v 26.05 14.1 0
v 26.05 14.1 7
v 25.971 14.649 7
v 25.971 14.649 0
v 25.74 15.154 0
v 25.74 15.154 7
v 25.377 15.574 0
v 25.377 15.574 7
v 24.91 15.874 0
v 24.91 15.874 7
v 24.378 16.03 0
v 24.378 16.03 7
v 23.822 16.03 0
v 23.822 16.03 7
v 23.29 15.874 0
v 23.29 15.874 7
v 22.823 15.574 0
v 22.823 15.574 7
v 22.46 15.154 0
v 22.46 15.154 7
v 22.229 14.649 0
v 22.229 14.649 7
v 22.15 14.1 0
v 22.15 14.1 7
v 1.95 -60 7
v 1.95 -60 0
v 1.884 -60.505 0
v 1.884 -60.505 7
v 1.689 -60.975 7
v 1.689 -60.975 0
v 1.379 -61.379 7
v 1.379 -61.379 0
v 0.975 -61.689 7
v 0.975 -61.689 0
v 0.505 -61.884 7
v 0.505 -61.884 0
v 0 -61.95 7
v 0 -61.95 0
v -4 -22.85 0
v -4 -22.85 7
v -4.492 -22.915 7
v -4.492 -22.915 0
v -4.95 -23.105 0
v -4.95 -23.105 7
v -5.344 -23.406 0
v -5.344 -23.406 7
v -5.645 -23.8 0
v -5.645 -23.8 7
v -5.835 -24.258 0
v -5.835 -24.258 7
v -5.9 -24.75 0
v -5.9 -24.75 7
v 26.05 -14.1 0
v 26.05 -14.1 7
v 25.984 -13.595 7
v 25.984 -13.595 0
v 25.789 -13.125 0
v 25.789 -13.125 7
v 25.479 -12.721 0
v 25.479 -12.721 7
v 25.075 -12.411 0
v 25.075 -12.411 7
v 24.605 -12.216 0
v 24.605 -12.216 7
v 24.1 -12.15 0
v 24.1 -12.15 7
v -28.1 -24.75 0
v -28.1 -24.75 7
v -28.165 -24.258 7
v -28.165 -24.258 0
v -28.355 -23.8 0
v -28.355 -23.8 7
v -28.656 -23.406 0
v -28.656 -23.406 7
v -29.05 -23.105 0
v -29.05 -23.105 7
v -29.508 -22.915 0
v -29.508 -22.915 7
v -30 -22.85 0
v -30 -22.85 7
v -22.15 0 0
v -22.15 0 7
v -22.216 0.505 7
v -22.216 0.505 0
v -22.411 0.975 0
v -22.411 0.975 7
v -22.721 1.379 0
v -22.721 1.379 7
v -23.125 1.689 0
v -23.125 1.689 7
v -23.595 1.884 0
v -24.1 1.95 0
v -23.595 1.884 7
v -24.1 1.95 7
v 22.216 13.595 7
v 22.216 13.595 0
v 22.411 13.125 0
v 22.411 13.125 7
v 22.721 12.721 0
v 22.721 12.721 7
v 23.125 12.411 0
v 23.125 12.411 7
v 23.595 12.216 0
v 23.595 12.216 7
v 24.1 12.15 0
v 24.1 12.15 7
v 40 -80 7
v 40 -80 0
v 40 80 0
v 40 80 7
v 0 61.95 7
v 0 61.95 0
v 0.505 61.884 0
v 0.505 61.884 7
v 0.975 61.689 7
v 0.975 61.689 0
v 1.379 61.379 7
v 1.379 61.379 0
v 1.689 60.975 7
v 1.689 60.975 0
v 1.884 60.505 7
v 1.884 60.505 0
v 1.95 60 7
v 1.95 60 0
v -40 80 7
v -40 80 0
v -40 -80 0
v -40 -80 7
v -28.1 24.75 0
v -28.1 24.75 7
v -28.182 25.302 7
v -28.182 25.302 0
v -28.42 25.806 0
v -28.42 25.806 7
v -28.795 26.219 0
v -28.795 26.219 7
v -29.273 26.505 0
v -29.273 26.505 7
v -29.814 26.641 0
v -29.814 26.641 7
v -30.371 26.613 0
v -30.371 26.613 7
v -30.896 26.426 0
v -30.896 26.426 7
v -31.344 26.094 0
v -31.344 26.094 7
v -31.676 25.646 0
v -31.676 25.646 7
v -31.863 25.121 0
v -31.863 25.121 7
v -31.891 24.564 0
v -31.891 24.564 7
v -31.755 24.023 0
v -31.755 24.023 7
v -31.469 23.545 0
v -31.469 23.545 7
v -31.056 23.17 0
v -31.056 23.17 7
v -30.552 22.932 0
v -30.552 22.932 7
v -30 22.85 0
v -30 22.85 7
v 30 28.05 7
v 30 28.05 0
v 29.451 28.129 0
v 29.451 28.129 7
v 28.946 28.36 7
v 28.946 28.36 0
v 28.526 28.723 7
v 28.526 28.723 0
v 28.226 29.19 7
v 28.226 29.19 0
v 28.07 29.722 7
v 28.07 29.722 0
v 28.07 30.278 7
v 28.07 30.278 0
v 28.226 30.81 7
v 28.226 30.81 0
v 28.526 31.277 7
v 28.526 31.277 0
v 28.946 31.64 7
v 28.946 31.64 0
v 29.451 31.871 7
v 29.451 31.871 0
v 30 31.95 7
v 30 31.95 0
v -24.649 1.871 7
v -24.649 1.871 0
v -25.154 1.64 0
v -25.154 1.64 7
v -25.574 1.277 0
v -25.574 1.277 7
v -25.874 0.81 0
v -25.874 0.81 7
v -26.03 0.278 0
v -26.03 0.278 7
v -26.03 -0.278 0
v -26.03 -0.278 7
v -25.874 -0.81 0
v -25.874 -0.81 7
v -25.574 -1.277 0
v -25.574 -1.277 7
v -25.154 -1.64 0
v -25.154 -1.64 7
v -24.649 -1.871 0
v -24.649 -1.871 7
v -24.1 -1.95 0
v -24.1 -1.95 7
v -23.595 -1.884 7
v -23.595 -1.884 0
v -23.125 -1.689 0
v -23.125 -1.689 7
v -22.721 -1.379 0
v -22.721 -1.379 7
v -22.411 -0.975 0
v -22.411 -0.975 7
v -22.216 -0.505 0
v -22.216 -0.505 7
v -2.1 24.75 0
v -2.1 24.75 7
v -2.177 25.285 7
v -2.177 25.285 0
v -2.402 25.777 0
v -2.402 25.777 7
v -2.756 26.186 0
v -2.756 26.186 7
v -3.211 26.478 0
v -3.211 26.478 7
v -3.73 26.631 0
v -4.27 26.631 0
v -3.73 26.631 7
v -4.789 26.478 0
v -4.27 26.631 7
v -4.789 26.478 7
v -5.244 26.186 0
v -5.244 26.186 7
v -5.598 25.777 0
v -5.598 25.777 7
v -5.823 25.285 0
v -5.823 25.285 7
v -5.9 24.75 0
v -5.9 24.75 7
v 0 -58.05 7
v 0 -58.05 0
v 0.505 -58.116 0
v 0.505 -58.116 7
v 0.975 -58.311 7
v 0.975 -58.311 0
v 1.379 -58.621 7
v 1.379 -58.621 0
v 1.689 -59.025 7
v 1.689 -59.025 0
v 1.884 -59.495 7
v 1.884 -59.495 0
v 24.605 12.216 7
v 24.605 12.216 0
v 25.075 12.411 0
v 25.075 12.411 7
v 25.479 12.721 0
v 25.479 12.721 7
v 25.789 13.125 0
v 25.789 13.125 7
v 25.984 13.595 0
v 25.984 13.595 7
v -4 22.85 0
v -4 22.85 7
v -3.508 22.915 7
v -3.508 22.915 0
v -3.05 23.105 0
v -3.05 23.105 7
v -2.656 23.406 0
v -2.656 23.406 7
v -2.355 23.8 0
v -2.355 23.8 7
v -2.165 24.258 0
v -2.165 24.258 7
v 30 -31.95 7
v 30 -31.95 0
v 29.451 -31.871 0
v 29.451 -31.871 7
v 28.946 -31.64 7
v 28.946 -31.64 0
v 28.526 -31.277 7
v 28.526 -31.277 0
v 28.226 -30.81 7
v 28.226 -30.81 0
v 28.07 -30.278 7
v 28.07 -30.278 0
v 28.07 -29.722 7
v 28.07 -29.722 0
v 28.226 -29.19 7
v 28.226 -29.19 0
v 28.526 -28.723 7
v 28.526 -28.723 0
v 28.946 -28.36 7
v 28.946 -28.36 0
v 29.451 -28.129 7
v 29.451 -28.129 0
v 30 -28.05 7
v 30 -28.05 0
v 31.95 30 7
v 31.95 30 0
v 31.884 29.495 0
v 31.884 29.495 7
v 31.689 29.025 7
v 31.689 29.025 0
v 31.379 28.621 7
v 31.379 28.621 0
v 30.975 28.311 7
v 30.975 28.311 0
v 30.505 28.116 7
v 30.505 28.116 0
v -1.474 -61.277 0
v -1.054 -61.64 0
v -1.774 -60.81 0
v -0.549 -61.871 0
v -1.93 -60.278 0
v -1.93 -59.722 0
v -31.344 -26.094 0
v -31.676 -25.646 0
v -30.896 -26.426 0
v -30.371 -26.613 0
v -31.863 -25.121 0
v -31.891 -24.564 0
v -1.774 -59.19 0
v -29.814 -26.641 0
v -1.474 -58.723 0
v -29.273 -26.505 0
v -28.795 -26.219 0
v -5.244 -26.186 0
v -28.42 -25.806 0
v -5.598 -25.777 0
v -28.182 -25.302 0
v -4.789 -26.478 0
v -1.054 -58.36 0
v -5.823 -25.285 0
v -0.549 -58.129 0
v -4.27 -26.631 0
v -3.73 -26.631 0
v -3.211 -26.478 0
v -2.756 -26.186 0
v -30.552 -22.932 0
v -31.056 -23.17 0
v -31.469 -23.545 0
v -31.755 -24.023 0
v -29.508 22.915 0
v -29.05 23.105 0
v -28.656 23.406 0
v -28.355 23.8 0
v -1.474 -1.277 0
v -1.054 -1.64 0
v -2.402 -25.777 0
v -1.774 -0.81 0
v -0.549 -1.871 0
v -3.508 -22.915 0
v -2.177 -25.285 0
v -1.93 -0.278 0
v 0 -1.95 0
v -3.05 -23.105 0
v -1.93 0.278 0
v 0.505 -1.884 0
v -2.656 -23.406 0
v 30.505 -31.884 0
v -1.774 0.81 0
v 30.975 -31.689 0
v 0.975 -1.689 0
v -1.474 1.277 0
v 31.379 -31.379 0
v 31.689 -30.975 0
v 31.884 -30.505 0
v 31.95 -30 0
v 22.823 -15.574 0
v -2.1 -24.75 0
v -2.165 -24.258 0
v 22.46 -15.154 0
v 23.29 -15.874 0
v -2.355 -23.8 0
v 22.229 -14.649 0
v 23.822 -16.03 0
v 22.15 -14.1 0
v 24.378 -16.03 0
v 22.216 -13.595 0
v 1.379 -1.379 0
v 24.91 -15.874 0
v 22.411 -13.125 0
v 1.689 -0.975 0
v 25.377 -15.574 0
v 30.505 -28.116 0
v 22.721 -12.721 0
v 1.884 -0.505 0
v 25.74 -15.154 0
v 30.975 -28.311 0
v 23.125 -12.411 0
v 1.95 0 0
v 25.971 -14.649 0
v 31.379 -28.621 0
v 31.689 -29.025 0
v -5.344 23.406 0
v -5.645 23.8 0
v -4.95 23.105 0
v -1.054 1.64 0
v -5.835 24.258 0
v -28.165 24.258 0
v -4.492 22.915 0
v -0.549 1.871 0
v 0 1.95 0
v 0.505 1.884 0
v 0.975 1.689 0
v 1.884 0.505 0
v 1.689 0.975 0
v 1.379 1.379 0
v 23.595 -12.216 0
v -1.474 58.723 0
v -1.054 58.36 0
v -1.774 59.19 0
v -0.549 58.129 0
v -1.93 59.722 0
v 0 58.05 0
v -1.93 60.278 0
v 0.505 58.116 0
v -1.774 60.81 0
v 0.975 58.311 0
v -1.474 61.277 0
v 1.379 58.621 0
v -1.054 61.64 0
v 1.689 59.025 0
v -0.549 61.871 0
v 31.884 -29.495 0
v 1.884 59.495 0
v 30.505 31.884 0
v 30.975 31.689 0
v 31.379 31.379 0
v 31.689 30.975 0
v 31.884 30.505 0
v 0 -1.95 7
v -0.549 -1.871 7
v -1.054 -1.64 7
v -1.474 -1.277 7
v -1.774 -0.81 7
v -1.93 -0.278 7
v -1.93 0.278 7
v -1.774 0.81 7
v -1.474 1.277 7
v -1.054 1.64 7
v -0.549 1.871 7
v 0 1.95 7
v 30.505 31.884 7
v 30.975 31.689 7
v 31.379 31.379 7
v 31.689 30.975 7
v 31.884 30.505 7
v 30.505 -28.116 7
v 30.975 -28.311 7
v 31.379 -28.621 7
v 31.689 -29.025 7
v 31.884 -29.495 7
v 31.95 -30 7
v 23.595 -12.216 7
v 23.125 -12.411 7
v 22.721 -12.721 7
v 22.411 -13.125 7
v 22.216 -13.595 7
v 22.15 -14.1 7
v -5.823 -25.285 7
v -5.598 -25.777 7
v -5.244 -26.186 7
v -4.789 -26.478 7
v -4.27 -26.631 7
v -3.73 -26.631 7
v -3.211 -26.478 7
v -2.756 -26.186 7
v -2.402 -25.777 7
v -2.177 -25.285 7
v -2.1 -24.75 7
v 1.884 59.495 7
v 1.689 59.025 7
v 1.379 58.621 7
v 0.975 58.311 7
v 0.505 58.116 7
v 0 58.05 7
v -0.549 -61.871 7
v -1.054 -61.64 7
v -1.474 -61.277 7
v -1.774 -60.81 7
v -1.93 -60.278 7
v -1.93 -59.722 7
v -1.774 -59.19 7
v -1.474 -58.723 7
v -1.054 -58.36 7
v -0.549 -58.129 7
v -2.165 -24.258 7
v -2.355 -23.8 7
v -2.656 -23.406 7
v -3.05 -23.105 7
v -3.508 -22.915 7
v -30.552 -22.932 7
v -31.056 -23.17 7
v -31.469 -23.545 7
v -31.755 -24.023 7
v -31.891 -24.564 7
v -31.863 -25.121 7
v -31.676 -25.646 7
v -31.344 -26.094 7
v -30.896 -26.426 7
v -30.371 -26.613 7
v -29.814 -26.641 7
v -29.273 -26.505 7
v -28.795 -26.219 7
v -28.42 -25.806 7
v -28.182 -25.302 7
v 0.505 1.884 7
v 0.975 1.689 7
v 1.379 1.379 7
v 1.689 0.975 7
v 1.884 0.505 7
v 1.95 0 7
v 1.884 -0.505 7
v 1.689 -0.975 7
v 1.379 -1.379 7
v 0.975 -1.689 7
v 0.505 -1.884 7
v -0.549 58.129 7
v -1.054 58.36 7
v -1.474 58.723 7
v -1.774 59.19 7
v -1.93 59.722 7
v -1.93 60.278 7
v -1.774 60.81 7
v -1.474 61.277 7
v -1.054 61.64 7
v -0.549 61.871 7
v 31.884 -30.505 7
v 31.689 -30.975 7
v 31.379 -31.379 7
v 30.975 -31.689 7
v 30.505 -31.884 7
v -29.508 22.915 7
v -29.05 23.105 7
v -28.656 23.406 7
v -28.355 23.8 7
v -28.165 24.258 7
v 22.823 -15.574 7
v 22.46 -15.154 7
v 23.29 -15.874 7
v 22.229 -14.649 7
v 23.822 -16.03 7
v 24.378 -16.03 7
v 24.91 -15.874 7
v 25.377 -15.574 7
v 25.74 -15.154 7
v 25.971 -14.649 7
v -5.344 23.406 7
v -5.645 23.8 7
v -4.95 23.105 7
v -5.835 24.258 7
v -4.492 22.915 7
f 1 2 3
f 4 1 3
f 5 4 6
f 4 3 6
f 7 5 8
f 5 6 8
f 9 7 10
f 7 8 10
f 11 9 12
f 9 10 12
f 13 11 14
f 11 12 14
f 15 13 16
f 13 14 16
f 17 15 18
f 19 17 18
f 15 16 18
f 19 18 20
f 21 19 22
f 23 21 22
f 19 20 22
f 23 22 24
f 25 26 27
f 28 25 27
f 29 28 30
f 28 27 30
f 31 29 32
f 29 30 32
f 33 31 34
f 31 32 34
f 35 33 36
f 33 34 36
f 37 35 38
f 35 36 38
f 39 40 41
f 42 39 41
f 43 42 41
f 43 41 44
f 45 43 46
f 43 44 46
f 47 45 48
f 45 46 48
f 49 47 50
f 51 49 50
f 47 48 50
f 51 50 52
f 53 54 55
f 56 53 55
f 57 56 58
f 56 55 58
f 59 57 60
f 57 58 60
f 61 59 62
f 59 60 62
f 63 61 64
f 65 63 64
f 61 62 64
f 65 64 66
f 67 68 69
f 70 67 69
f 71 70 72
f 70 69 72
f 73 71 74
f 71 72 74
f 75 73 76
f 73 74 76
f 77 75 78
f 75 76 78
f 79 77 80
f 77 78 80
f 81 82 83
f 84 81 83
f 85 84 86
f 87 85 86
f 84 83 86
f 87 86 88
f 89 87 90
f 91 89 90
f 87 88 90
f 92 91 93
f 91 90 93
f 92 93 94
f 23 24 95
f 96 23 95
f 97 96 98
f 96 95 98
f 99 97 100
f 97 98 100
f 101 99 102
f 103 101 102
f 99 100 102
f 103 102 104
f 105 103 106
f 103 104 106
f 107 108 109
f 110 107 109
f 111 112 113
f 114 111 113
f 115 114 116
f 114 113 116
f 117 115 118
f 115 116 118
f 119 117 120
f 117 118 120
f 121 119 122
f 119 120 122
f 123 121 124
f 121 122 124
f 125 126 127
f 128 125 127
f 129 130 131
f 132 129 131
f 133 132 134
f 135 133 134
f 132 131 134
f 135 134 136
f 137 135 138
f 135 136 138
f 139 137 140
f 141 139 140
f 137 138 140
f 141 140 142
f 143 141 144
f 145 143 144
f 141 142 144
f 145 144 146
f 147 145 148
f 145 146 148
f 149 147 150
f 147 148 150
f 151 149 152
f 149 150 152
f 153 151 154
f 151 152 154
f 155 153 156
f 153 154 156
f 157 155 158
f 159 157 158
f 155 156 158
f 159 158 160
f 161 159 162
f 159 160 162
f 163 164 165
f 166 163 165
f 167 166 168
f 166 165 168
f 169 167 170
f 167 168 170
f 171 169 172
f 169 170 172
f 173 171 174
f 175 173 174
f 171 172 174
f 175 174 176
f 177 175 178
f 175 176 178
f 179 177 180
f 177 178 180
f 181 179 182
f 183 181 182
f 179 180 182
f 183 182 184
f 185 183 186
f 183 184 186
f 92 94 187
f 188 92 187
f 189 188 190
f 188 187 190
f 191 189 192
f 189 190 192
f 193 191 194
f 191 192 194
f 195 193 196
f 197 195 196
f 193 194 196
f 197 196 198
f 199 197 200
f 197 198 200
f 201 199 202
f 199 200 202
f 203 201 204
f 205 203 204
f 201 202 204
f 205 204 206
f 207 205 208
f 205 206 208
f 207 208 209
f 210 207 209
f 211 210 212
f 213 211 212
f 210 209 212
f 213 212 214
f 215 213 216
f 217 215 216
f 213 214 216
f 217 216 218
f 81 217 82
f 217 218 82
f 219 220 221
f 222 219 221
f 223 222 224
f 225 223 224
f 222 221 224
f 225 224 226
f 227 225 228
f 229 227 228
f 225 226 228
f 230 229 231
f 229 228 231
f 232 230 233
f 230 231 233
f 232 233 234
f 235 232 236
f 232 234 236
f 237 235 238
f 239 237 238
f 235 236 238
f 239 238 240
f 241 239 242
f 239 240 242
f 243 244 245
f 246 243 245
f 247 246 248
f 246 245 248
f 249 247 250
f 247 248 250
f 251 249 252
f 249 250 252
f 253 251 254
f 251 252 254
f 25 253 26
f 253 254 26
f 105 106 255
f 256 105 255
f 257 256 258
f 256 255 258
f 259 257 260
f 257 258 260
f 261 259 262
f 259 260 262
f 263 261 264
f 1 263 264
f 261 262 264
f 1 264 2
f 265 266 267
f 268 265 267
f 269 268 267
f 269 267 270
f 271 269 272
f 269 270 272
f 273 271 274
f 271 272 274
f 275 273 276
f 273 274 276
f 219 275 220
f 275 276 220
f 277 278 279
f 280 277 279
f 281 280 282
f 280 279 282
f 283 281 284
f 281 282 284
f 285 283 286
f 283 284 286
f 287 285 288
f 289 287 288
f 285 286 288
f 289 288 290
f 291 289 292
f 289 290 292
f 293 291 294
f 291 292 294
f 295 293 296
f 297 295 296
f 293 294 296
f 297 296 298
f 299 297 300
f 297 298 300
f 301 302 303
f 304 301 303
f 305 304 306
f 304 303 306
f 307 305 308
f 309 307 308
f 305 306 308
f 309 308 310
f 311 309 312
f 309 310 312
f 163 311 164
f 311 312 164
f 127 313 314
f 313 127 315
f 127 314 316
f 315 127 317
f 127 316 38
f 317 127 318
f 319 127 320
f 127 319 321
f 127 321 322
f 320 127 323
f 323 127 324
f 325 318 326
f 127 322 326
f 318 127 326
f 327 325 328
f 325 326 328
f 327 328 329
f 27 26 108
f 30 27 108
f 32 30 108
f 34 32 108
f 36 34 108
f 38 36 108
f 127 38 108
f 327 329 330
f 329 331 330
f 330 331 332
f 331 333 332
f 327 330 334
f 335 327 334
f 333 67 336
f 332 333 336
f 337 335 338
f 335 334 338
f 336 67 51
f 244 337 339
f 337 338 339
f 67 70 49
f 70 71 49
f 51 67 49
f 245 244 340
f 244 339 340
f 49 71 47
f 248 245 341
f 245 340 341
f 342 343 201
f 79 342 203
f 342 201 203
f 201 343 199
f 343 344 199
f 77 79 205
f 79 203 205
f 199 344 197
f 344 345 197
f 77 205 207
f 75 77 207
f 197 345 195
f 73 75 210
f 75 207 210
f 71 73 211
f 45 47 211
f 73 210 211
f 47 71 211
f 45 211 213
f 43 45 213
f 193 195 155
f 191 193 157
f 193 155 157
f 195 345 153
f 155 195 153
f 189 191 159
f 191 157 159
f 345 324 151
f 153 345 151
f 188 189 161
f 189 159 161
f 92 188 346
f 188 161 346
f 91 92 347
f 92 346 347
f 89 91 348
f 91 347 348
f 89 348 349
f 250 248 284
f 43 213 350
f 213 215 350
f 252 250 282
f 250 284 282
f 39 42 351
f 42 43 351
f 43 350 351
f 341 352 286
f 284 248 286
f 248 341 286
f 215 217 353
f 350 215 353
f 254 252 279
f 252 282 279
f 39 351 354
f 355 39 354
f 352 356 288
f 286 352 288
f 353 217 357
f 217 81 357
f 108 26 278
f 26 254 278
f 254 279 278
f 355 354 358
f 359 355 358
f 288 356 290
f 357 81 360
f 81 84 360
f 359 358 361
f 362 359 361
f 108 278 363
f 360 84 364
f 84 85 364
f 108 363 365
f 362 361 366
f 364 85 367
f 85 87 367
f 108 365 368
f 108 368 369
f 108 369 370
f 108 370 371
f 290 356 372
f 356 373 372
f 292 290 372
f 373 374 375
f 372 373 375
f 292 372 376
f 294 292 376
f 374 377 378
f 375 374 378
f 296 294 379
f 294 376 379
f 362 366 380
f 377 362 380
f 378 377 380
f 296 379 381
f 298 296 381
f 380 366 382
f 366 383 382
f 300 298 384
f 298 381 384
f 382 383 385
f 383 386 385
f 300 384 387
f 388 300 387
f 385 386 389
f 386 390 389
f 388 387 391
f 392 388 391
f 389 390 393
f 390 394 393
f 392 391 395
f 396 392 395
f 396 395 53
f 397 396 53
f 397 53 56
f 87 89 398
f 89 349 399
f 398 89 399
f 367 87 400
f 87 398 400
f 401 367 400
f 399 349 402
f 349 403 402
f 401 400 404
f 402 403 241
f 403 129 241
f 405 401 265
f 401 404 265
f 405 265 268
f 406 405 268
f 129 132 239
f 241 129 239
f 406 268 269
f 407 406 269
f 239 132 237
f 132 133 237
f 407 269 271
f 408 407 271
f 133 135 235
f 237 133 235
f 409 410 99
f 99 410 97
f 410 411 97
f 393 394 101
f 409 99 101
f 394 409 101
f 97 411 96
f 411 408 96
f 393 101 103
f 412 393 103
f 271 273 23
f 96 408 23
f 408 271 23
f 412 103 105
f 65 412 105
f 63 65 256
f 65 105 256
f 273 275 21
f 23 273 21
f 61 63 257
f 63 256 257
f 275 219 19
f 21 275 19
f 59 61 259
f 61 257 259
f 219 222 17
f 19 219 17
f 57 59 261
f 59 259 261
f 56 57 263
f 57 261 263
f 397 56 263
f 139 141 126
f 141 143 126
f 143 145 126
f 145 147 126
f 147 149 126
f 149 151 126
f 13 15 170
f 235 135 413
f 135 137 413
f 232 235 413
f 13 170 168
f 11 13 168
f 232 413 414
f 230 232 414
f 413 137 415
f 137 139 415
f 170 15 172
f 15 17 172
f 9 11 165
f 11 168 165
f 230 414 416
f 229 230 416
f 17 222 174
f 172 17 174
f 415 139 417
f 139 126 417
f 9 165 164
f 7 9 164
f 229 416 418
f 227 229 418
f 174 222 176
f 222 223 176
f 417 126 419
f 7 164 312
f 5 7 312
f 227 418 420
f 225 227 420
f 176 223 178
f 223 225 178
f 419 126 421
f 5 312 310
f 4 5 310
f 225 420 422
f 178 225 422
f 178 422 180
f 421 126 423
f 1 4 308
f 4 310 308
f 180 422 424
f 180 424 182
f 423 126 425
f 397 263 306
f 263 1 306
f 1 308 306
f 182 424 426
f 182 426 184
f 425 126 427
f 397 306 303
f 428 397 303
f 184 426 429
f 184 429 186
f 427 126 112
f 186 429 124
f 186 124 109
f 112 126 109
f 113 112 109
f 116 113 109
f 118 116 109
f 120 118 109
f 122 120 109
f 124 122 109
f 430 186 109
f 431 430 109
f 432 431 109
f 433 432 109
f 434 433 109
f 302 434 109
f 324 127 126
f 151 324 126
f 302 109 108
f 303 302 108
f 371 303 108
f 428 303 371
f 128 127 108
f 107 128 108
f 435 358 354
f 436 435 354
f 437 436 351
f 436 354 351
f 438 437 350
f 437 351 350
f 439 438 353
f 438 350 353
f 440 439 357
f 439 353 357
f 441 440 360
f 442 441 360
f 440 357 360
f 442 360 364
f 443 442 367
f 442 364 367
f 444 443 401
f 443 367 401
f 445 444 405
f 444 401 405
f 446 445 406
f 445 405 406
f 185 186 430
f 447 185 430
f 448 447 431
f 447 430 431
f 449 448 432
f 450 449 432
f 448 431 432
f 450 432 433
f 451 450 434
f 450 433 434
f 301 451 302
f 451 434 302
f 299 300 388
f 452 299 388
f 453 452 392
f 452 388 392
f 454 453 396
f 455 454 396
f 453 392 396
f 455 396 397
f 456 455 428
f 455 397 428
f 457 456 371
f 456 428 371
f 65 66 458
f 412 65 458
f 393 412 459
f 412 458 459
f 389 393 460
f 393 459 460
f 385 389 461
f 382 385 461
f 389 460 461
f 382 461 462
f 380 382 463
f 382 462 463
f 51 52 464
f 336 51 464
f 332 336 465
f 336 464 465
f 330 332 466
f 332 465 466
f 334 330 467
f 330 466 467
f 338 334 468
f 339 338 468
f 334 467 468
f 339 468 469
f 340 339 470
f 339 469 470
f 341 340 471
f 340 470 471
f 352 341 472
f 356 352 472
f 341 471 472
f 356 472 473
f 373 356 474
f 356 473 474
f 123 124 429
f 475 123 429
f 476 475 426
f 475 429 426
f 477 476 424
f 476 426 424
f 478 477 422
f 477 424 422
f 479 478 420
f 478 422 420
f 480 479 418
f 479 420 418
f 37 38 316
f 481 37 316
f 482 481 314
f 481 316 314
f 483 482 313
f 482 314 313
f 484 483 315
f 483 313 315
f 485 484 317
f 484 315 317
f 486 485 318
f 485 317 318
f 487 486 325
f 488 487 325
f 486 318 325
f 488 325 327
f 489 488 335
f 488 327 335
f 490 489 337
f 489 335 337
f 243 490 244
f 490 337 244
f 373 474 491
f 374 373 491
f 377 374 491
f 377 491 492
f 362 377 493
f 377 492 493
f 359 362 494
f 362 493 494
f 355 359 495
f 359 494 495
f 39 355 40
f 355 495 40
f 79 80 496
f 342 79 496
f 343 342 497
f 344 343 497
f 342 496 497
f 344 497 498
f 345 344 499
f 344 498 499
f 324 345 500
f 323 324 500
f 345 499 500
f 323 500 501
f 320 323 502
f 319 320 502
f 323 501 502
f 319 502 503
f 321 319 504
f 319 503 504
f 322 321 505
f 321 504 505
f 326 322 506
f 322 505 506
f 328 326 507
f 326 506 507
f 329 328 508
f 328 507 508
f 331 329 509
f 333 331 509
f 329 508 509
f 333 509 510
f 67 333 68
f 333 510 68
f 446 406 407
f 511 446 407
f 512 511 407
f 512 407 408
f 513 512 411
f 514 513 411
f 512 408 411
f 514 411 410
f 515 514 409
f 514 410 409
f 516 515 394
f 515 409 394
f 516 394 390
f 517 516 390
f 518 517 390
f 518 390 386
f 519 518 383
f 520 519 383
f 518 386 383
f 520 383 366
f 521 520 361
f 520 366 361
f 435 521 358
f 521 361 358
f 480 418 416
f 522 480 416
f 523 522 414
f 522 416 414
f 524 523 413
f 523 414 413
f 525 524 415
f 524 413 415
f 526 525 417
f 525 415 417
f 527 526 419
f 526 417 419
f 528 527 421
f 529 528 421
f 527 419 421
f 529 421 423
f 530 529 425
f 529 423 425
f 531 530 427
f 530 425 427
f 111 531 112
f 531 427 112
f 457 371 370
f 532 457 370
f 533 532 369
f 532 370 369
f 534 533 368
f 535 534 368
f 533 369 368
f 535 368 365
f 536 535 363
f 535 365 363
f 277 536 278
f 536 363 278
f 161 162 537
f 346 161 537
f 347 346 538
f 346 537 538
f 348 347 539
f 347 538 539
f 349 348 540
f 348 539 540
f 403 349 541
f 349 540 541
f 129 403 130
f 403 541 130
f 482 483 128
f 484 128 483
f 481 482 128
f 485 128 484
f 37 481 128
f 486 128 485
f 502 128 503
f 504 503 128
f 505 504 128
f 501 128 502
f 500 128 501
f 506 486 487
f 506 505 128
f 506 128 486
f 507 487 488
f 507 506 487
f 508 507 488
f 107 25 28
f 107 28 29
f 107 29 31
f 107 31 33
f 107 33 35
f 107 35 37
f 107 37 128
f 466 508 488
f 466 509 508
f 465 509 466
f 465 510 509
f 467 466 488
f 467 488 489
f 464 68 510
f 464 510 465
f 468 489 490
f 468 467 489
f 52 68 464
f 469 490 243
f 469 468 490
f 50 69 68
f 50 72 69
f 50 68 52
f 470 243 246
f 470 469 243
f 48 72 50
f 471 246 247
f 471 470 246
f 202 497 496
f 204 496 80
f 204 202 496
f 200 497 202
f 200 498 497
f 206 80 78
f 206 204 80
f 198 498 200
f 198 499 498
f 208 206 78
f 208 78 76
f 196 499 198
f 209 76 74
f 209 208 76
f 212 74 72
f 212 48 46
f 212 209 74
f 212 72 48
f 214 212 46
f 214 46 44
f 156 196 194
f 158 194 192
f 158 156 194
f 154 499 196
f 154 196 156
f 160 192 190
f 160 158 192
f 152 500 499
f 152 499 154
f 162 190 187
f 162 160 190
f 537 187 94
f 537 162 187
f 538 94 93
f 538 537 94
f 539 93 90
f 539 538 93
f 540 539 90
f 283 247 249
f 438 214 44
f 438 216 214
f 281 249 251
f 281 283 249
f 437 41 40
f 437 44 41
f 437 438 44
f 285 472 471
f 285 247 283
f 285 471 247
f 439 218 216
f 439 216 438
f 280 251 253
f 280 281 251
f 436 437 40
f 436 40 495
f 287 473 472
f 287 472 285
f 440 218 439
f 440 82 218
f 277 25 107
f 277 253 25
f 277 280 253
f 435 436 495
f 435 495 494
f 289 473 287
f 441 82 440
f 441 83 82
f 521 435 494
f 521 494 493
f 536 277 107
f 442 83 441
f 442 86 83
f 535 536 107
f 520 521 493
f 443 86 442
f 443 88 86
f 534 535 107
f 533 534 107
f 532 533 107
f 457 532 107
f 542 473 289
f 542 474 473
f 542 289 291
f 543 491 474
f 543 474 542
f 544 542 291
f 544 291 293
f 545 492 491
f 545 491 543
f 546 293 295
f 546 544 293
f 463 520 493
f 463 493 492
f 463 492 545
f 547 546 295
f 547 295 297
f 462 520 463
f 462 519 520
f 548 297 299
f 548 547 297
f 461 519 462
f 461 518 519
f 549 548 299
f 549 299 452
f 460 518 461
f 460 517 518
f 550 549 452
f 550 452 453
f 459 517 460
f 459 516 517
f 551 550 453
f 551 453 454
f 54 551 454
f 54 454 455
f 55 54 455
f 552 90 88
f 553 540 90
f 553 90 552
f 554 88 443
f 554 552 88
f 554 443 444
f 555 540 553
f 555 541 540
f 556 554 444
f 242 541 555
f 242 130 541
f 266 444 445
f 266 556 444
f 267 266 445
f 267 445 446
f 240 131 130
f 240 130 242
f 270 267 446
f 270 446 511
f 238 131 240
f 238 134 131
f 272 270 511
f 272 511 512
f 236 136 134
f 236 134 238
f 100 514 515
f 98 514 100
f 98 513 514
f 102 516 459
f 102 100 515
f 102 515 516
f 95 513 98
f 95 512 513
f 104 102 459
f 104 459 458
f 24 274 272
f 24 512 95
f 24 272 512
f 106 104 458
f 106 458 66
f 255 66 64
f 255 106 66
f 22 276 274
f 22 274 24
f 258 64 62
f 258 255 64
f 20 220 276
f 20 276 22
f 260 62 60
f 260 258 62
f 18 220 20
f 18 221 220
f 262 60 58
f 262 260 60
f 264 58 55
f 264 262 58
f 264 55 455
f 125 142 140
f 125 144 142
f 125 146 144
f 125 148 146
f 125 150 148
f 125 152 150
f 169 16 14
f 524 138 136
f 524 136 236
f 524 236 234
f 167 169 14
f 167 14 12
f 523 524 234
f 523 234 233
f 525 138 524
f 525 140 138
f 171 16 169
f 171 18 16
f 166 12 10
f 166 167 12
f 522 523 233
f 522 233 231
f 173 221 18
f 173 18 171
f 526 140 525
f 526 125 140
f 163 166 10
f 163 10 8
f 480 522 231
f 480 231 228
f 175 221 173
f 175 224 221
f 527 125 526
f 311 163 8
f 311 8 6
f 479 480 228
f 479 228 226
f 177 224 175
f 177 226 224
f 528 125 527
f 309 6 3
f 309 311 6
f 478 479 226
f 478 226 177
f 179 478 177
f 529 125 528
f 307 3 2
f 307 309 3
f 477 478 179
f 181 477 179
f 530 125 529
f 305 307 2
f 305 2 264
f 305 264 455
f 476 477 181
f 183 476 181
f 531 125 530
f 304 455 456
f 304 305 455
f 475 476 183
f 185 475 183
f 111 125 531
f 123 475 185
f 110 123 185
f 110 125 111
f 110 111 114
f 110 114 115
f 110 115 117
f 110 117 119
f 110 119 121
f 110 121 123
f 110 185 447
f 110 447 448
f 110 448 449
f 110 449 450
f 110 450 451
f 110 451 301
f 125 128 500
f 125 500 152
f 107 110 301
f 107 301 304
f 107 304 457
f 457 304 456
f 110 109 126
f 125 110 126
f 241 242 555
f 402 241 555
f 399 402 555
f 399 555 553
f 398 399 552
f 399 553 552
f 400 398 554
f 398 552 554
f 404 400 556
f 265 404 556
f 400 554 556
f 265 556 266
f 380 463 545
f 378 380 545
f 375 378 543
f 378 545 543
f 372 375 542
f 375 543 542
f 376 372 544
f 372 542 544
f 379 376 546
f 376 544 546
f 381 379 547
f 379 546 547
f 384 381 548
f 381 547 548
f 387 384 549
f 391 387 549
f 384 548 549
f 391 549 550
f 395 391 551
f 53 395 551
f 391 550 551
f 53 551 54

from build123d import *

# Parameters (mm, degrees)
EXTRUDE_1_DEPTH     = 7
CUT_EXTRUDE_2_DEPTH = 10
CUT_EXTRUDE_1_DEPTH = 10


with BuildPart() as part:
    # 草图1 → 凸台-拉伸1 (new body)
    with BuildSketch(Plane.XY):
        with BuildLine():
            Line((0, 61.95), (0, 80))
            Line((0, 80), (-40, 80))
            Line((-40, 80), (-40, -80))
            Line((-40, -80), (0, -80))
            Line((0, -80), (0, -61.95))
            ThreePointArc((0, -61.95), (-1.95, -60), (0, -58.05))
            Line((0, -58.05), (0, -1.95))
            ThreePointArc((0, -1.95), (-1.95, 0), (0, 1.95))
            Line((0, 1.95), (0, 58.05))
            ThreePointArc((0, 58.05), (-1.95, 60), (0, 61.95))
        make_face()
        with BuildLine():
            Line((30, 80), (0, 80))
            Line((0, 80), (0, 61.95))
            ThreePointArc((0, 61.95), (1.378858223, 61.378858223), (1.95, 60))
            ThreePointArc((1.95, 60), (1.378858223, 58.621141777), (0, 58.05))
            Line((0, 58.05), (0, 1.95))
            ThreePointArc((0, 1.95), (1.378858223, 1.378858223), (1.95, 0))
            ThreePointArc((1.95, 0), (1.378858223, -1.378858223), (0, -1.95))
            Line((0, -1.95), (0, -58.05))
            ThreePointArc((0, -58.05), (1.378858223, -58.621141777), (1.95, -60))
            ThreePointArc((1.95, -60), (1.378858223, -61.378858223), (0, -61.95))
            Line((0, -61.95), (0, -80))
            Line((0, -80), (30, -80))
            Line((30, -80), (30, -31.95))
            ThreePointArc((30, -31.95), (28.05, -30), (30, -28.05))
            Line((30, -28.05), (30, 28.05))
            ThreePointArc((30, 28.05), (28.05, 30), (30, 31.95))
            Line((30, 31.95), (30, 80))
        make_face()
        with BuildLine():
            Line((40, 80), (30, 80))
            Line((30, 80), (30, 31.95))
            ThreePointArc((30, 31.95), (31.378858223, 31.378858223), (31.95, 30))
            ThreePointArc((31.95, 30), (31.378858223, 28.621141777), (30, 28.05))
            Line((30, 28.05), (30, -28.05))
            ThreePointArc((30, -28.05), (31.378858223, -28.621141777), (31.95, -30))
            ThreePointArc((31.95, -30), (31.378858223, -31.378858223), (30, -31.95))
            Line((30, -31.95), (30, -80))
            Line((30, -80), (40, -80))
            Line((40, -80), (40, 80))
        make_face()
    extrude(amount=EXTRUDE_1_DEPTH)

    # 草图3 → 切除-拉伸2 (cut)
    with BuildSketch(Plane.XY.offset(7)):
        with BuildLine():
            ThreePointArc((-28.1, 24.75), (-31.343502884, 26.093502884), (-30, 22.85))
            Line((-30, 22.85), (-30, 24.75))
            Line((-30, 24.75), (-28.1, 24.75))
        make_face()
        with BuildLine():
            Line((-30, 24.75), (-30, 22.85))
            ThreePointArc((-30, 22.85), (-28.656497116, 23.406497116), (-28.1, 24.75))
            Line((-28.1, 24.75), (-30, 24.75))
        make_face()
        with BuildLine():
            ThreePointArc((-5.9, 24.75), (-5.343502884, 23.406497116), (-4, 22.85))
            Line((-4, 22.85), (-4, 24.75))
            Line((-4, 24.75), (-5.9, 24.75))
        make_face()
        with BuildLine():
            Line((-4, 24.75), (-4, 22.85))
            ThreePointArc((-4, 22.85), (-2.656497116, 23.406497116), (-2.1, 24.75))
            ThreePointArc((-2.1, 24.75), (-4, 26.65), (-5.9, 24.75))
            Line((-5.9, 24.75), (-4, 24.75))
        make_face()
        with BuildLine():
            Line((-30, -22.85), (-30, -24.75))
            Line((-30, -24.75), (-28.1, -24.75))
            ThreePointArc((-28.1, -24.75), (-28.656497116, -23.406497116), (-30, -22.85))
        make_face()
        with BuildLine():
            Line((-28.1, -24.75), (-30, -24.75))
            Line((-30, -24.75), (-30, -22.85))
            ThreePointArc((-30, -22.85), (-31.343502884, -26.093502884), (-28.1, -24.75))
        make_face()
        with BuildLine():
            ThreePointArc((-4, -22.85), (-5.343502884, -23.406497116), (-5.9, -24.75))
            Line((-5.9, -24.75), (-4, -24.75))
            Line((-4, -24.75), (-4, -22.85))
        make_face()
        with BuildLine():
            Line((-4, -24.75), (-5.9, -24.75))
            ThreePointArc((-5.9, -24.75), (-4, -26.65), (-2.1, -24.75))
            ThreePointArc((-2.1, -24.75), (-2.656497116, -23.406497116), (-4, -22.85))
            Line((-4, -22.85), (-4, -24.75))
        make_face()
    extrude(amount=-CUT_EXTRUDE_2_DEPTH, mode=Mode.SUBTRACT)

    # 草图2 → 切除-拉伸1 (cut)
    with BuildSketch(Plane.XY.offset(7)):
        with BuildLine():
            ThreePointArc((-24.1, 1.95), (-26.05, 0), (-24.1, -1.95))
            Line((-24.1, -1.95), (-24.1, 1.95))
        make_face()
        with BuildLine():
            Line((-24.1, 1.95), (-24.1, -1.95))
            ThreePointArc((-24.1, -1.95), (-22.721141777, -1.378858223), (-22.15, 0))
            ThreePointArc((-22.15, 0), (-22.721141777, 1.378858223), (-24.1, 1.95))
        make_face()
        with BuildLine():
            ThreePointArc((24.1, -12.15), (22.721141777, -12.721141777), (22.15, -14.1))
            Line((22.15, -14.1), (24.1, -14.1))
            Line((24.1, -14.1), (24.1, -12.15))
        make_face()
        with BuildLine():
            Line((24.1, -14.1), (22.15, -14.1))
            ThreePointArc((22.15, -14.1), (24.1, -16.05), (26.05, -14.1))
            ThreePointArc((26.05, -14.1), (25.478858223, -12.721141777), (24.1, -12.15))
            Line((24.1, -12.15), (24.1, -14.1))
        make_face()
        with BuildLine():
            ThreePointArc((22.15, 14.1), (22.721141777, 12.721141777), (24.1, 12.15))
            Line((24.1, 12.15), (24.1, 14.1))
            Line((24.1, 14.1), (22.15, 14.1))
        make_face()
        with BuildLine():
            Line((24.1, 14.1), (24.1, 12.15))
            ThreePointArc((24.1, 12.15), (25.478858223, 12.721141777), (26.05, 14.1))
            ThreePointArc((26.05, 14.1), (24.1, 16.05), (22.15, 14.1))
            Line((22.15, 14.1), (24.1, 14.1))
        make_face()
    extrude(amount=-CUT_EXTRUDE_1_DEPTH, mode=Mode.SUBTRACT)


solid = part.part
